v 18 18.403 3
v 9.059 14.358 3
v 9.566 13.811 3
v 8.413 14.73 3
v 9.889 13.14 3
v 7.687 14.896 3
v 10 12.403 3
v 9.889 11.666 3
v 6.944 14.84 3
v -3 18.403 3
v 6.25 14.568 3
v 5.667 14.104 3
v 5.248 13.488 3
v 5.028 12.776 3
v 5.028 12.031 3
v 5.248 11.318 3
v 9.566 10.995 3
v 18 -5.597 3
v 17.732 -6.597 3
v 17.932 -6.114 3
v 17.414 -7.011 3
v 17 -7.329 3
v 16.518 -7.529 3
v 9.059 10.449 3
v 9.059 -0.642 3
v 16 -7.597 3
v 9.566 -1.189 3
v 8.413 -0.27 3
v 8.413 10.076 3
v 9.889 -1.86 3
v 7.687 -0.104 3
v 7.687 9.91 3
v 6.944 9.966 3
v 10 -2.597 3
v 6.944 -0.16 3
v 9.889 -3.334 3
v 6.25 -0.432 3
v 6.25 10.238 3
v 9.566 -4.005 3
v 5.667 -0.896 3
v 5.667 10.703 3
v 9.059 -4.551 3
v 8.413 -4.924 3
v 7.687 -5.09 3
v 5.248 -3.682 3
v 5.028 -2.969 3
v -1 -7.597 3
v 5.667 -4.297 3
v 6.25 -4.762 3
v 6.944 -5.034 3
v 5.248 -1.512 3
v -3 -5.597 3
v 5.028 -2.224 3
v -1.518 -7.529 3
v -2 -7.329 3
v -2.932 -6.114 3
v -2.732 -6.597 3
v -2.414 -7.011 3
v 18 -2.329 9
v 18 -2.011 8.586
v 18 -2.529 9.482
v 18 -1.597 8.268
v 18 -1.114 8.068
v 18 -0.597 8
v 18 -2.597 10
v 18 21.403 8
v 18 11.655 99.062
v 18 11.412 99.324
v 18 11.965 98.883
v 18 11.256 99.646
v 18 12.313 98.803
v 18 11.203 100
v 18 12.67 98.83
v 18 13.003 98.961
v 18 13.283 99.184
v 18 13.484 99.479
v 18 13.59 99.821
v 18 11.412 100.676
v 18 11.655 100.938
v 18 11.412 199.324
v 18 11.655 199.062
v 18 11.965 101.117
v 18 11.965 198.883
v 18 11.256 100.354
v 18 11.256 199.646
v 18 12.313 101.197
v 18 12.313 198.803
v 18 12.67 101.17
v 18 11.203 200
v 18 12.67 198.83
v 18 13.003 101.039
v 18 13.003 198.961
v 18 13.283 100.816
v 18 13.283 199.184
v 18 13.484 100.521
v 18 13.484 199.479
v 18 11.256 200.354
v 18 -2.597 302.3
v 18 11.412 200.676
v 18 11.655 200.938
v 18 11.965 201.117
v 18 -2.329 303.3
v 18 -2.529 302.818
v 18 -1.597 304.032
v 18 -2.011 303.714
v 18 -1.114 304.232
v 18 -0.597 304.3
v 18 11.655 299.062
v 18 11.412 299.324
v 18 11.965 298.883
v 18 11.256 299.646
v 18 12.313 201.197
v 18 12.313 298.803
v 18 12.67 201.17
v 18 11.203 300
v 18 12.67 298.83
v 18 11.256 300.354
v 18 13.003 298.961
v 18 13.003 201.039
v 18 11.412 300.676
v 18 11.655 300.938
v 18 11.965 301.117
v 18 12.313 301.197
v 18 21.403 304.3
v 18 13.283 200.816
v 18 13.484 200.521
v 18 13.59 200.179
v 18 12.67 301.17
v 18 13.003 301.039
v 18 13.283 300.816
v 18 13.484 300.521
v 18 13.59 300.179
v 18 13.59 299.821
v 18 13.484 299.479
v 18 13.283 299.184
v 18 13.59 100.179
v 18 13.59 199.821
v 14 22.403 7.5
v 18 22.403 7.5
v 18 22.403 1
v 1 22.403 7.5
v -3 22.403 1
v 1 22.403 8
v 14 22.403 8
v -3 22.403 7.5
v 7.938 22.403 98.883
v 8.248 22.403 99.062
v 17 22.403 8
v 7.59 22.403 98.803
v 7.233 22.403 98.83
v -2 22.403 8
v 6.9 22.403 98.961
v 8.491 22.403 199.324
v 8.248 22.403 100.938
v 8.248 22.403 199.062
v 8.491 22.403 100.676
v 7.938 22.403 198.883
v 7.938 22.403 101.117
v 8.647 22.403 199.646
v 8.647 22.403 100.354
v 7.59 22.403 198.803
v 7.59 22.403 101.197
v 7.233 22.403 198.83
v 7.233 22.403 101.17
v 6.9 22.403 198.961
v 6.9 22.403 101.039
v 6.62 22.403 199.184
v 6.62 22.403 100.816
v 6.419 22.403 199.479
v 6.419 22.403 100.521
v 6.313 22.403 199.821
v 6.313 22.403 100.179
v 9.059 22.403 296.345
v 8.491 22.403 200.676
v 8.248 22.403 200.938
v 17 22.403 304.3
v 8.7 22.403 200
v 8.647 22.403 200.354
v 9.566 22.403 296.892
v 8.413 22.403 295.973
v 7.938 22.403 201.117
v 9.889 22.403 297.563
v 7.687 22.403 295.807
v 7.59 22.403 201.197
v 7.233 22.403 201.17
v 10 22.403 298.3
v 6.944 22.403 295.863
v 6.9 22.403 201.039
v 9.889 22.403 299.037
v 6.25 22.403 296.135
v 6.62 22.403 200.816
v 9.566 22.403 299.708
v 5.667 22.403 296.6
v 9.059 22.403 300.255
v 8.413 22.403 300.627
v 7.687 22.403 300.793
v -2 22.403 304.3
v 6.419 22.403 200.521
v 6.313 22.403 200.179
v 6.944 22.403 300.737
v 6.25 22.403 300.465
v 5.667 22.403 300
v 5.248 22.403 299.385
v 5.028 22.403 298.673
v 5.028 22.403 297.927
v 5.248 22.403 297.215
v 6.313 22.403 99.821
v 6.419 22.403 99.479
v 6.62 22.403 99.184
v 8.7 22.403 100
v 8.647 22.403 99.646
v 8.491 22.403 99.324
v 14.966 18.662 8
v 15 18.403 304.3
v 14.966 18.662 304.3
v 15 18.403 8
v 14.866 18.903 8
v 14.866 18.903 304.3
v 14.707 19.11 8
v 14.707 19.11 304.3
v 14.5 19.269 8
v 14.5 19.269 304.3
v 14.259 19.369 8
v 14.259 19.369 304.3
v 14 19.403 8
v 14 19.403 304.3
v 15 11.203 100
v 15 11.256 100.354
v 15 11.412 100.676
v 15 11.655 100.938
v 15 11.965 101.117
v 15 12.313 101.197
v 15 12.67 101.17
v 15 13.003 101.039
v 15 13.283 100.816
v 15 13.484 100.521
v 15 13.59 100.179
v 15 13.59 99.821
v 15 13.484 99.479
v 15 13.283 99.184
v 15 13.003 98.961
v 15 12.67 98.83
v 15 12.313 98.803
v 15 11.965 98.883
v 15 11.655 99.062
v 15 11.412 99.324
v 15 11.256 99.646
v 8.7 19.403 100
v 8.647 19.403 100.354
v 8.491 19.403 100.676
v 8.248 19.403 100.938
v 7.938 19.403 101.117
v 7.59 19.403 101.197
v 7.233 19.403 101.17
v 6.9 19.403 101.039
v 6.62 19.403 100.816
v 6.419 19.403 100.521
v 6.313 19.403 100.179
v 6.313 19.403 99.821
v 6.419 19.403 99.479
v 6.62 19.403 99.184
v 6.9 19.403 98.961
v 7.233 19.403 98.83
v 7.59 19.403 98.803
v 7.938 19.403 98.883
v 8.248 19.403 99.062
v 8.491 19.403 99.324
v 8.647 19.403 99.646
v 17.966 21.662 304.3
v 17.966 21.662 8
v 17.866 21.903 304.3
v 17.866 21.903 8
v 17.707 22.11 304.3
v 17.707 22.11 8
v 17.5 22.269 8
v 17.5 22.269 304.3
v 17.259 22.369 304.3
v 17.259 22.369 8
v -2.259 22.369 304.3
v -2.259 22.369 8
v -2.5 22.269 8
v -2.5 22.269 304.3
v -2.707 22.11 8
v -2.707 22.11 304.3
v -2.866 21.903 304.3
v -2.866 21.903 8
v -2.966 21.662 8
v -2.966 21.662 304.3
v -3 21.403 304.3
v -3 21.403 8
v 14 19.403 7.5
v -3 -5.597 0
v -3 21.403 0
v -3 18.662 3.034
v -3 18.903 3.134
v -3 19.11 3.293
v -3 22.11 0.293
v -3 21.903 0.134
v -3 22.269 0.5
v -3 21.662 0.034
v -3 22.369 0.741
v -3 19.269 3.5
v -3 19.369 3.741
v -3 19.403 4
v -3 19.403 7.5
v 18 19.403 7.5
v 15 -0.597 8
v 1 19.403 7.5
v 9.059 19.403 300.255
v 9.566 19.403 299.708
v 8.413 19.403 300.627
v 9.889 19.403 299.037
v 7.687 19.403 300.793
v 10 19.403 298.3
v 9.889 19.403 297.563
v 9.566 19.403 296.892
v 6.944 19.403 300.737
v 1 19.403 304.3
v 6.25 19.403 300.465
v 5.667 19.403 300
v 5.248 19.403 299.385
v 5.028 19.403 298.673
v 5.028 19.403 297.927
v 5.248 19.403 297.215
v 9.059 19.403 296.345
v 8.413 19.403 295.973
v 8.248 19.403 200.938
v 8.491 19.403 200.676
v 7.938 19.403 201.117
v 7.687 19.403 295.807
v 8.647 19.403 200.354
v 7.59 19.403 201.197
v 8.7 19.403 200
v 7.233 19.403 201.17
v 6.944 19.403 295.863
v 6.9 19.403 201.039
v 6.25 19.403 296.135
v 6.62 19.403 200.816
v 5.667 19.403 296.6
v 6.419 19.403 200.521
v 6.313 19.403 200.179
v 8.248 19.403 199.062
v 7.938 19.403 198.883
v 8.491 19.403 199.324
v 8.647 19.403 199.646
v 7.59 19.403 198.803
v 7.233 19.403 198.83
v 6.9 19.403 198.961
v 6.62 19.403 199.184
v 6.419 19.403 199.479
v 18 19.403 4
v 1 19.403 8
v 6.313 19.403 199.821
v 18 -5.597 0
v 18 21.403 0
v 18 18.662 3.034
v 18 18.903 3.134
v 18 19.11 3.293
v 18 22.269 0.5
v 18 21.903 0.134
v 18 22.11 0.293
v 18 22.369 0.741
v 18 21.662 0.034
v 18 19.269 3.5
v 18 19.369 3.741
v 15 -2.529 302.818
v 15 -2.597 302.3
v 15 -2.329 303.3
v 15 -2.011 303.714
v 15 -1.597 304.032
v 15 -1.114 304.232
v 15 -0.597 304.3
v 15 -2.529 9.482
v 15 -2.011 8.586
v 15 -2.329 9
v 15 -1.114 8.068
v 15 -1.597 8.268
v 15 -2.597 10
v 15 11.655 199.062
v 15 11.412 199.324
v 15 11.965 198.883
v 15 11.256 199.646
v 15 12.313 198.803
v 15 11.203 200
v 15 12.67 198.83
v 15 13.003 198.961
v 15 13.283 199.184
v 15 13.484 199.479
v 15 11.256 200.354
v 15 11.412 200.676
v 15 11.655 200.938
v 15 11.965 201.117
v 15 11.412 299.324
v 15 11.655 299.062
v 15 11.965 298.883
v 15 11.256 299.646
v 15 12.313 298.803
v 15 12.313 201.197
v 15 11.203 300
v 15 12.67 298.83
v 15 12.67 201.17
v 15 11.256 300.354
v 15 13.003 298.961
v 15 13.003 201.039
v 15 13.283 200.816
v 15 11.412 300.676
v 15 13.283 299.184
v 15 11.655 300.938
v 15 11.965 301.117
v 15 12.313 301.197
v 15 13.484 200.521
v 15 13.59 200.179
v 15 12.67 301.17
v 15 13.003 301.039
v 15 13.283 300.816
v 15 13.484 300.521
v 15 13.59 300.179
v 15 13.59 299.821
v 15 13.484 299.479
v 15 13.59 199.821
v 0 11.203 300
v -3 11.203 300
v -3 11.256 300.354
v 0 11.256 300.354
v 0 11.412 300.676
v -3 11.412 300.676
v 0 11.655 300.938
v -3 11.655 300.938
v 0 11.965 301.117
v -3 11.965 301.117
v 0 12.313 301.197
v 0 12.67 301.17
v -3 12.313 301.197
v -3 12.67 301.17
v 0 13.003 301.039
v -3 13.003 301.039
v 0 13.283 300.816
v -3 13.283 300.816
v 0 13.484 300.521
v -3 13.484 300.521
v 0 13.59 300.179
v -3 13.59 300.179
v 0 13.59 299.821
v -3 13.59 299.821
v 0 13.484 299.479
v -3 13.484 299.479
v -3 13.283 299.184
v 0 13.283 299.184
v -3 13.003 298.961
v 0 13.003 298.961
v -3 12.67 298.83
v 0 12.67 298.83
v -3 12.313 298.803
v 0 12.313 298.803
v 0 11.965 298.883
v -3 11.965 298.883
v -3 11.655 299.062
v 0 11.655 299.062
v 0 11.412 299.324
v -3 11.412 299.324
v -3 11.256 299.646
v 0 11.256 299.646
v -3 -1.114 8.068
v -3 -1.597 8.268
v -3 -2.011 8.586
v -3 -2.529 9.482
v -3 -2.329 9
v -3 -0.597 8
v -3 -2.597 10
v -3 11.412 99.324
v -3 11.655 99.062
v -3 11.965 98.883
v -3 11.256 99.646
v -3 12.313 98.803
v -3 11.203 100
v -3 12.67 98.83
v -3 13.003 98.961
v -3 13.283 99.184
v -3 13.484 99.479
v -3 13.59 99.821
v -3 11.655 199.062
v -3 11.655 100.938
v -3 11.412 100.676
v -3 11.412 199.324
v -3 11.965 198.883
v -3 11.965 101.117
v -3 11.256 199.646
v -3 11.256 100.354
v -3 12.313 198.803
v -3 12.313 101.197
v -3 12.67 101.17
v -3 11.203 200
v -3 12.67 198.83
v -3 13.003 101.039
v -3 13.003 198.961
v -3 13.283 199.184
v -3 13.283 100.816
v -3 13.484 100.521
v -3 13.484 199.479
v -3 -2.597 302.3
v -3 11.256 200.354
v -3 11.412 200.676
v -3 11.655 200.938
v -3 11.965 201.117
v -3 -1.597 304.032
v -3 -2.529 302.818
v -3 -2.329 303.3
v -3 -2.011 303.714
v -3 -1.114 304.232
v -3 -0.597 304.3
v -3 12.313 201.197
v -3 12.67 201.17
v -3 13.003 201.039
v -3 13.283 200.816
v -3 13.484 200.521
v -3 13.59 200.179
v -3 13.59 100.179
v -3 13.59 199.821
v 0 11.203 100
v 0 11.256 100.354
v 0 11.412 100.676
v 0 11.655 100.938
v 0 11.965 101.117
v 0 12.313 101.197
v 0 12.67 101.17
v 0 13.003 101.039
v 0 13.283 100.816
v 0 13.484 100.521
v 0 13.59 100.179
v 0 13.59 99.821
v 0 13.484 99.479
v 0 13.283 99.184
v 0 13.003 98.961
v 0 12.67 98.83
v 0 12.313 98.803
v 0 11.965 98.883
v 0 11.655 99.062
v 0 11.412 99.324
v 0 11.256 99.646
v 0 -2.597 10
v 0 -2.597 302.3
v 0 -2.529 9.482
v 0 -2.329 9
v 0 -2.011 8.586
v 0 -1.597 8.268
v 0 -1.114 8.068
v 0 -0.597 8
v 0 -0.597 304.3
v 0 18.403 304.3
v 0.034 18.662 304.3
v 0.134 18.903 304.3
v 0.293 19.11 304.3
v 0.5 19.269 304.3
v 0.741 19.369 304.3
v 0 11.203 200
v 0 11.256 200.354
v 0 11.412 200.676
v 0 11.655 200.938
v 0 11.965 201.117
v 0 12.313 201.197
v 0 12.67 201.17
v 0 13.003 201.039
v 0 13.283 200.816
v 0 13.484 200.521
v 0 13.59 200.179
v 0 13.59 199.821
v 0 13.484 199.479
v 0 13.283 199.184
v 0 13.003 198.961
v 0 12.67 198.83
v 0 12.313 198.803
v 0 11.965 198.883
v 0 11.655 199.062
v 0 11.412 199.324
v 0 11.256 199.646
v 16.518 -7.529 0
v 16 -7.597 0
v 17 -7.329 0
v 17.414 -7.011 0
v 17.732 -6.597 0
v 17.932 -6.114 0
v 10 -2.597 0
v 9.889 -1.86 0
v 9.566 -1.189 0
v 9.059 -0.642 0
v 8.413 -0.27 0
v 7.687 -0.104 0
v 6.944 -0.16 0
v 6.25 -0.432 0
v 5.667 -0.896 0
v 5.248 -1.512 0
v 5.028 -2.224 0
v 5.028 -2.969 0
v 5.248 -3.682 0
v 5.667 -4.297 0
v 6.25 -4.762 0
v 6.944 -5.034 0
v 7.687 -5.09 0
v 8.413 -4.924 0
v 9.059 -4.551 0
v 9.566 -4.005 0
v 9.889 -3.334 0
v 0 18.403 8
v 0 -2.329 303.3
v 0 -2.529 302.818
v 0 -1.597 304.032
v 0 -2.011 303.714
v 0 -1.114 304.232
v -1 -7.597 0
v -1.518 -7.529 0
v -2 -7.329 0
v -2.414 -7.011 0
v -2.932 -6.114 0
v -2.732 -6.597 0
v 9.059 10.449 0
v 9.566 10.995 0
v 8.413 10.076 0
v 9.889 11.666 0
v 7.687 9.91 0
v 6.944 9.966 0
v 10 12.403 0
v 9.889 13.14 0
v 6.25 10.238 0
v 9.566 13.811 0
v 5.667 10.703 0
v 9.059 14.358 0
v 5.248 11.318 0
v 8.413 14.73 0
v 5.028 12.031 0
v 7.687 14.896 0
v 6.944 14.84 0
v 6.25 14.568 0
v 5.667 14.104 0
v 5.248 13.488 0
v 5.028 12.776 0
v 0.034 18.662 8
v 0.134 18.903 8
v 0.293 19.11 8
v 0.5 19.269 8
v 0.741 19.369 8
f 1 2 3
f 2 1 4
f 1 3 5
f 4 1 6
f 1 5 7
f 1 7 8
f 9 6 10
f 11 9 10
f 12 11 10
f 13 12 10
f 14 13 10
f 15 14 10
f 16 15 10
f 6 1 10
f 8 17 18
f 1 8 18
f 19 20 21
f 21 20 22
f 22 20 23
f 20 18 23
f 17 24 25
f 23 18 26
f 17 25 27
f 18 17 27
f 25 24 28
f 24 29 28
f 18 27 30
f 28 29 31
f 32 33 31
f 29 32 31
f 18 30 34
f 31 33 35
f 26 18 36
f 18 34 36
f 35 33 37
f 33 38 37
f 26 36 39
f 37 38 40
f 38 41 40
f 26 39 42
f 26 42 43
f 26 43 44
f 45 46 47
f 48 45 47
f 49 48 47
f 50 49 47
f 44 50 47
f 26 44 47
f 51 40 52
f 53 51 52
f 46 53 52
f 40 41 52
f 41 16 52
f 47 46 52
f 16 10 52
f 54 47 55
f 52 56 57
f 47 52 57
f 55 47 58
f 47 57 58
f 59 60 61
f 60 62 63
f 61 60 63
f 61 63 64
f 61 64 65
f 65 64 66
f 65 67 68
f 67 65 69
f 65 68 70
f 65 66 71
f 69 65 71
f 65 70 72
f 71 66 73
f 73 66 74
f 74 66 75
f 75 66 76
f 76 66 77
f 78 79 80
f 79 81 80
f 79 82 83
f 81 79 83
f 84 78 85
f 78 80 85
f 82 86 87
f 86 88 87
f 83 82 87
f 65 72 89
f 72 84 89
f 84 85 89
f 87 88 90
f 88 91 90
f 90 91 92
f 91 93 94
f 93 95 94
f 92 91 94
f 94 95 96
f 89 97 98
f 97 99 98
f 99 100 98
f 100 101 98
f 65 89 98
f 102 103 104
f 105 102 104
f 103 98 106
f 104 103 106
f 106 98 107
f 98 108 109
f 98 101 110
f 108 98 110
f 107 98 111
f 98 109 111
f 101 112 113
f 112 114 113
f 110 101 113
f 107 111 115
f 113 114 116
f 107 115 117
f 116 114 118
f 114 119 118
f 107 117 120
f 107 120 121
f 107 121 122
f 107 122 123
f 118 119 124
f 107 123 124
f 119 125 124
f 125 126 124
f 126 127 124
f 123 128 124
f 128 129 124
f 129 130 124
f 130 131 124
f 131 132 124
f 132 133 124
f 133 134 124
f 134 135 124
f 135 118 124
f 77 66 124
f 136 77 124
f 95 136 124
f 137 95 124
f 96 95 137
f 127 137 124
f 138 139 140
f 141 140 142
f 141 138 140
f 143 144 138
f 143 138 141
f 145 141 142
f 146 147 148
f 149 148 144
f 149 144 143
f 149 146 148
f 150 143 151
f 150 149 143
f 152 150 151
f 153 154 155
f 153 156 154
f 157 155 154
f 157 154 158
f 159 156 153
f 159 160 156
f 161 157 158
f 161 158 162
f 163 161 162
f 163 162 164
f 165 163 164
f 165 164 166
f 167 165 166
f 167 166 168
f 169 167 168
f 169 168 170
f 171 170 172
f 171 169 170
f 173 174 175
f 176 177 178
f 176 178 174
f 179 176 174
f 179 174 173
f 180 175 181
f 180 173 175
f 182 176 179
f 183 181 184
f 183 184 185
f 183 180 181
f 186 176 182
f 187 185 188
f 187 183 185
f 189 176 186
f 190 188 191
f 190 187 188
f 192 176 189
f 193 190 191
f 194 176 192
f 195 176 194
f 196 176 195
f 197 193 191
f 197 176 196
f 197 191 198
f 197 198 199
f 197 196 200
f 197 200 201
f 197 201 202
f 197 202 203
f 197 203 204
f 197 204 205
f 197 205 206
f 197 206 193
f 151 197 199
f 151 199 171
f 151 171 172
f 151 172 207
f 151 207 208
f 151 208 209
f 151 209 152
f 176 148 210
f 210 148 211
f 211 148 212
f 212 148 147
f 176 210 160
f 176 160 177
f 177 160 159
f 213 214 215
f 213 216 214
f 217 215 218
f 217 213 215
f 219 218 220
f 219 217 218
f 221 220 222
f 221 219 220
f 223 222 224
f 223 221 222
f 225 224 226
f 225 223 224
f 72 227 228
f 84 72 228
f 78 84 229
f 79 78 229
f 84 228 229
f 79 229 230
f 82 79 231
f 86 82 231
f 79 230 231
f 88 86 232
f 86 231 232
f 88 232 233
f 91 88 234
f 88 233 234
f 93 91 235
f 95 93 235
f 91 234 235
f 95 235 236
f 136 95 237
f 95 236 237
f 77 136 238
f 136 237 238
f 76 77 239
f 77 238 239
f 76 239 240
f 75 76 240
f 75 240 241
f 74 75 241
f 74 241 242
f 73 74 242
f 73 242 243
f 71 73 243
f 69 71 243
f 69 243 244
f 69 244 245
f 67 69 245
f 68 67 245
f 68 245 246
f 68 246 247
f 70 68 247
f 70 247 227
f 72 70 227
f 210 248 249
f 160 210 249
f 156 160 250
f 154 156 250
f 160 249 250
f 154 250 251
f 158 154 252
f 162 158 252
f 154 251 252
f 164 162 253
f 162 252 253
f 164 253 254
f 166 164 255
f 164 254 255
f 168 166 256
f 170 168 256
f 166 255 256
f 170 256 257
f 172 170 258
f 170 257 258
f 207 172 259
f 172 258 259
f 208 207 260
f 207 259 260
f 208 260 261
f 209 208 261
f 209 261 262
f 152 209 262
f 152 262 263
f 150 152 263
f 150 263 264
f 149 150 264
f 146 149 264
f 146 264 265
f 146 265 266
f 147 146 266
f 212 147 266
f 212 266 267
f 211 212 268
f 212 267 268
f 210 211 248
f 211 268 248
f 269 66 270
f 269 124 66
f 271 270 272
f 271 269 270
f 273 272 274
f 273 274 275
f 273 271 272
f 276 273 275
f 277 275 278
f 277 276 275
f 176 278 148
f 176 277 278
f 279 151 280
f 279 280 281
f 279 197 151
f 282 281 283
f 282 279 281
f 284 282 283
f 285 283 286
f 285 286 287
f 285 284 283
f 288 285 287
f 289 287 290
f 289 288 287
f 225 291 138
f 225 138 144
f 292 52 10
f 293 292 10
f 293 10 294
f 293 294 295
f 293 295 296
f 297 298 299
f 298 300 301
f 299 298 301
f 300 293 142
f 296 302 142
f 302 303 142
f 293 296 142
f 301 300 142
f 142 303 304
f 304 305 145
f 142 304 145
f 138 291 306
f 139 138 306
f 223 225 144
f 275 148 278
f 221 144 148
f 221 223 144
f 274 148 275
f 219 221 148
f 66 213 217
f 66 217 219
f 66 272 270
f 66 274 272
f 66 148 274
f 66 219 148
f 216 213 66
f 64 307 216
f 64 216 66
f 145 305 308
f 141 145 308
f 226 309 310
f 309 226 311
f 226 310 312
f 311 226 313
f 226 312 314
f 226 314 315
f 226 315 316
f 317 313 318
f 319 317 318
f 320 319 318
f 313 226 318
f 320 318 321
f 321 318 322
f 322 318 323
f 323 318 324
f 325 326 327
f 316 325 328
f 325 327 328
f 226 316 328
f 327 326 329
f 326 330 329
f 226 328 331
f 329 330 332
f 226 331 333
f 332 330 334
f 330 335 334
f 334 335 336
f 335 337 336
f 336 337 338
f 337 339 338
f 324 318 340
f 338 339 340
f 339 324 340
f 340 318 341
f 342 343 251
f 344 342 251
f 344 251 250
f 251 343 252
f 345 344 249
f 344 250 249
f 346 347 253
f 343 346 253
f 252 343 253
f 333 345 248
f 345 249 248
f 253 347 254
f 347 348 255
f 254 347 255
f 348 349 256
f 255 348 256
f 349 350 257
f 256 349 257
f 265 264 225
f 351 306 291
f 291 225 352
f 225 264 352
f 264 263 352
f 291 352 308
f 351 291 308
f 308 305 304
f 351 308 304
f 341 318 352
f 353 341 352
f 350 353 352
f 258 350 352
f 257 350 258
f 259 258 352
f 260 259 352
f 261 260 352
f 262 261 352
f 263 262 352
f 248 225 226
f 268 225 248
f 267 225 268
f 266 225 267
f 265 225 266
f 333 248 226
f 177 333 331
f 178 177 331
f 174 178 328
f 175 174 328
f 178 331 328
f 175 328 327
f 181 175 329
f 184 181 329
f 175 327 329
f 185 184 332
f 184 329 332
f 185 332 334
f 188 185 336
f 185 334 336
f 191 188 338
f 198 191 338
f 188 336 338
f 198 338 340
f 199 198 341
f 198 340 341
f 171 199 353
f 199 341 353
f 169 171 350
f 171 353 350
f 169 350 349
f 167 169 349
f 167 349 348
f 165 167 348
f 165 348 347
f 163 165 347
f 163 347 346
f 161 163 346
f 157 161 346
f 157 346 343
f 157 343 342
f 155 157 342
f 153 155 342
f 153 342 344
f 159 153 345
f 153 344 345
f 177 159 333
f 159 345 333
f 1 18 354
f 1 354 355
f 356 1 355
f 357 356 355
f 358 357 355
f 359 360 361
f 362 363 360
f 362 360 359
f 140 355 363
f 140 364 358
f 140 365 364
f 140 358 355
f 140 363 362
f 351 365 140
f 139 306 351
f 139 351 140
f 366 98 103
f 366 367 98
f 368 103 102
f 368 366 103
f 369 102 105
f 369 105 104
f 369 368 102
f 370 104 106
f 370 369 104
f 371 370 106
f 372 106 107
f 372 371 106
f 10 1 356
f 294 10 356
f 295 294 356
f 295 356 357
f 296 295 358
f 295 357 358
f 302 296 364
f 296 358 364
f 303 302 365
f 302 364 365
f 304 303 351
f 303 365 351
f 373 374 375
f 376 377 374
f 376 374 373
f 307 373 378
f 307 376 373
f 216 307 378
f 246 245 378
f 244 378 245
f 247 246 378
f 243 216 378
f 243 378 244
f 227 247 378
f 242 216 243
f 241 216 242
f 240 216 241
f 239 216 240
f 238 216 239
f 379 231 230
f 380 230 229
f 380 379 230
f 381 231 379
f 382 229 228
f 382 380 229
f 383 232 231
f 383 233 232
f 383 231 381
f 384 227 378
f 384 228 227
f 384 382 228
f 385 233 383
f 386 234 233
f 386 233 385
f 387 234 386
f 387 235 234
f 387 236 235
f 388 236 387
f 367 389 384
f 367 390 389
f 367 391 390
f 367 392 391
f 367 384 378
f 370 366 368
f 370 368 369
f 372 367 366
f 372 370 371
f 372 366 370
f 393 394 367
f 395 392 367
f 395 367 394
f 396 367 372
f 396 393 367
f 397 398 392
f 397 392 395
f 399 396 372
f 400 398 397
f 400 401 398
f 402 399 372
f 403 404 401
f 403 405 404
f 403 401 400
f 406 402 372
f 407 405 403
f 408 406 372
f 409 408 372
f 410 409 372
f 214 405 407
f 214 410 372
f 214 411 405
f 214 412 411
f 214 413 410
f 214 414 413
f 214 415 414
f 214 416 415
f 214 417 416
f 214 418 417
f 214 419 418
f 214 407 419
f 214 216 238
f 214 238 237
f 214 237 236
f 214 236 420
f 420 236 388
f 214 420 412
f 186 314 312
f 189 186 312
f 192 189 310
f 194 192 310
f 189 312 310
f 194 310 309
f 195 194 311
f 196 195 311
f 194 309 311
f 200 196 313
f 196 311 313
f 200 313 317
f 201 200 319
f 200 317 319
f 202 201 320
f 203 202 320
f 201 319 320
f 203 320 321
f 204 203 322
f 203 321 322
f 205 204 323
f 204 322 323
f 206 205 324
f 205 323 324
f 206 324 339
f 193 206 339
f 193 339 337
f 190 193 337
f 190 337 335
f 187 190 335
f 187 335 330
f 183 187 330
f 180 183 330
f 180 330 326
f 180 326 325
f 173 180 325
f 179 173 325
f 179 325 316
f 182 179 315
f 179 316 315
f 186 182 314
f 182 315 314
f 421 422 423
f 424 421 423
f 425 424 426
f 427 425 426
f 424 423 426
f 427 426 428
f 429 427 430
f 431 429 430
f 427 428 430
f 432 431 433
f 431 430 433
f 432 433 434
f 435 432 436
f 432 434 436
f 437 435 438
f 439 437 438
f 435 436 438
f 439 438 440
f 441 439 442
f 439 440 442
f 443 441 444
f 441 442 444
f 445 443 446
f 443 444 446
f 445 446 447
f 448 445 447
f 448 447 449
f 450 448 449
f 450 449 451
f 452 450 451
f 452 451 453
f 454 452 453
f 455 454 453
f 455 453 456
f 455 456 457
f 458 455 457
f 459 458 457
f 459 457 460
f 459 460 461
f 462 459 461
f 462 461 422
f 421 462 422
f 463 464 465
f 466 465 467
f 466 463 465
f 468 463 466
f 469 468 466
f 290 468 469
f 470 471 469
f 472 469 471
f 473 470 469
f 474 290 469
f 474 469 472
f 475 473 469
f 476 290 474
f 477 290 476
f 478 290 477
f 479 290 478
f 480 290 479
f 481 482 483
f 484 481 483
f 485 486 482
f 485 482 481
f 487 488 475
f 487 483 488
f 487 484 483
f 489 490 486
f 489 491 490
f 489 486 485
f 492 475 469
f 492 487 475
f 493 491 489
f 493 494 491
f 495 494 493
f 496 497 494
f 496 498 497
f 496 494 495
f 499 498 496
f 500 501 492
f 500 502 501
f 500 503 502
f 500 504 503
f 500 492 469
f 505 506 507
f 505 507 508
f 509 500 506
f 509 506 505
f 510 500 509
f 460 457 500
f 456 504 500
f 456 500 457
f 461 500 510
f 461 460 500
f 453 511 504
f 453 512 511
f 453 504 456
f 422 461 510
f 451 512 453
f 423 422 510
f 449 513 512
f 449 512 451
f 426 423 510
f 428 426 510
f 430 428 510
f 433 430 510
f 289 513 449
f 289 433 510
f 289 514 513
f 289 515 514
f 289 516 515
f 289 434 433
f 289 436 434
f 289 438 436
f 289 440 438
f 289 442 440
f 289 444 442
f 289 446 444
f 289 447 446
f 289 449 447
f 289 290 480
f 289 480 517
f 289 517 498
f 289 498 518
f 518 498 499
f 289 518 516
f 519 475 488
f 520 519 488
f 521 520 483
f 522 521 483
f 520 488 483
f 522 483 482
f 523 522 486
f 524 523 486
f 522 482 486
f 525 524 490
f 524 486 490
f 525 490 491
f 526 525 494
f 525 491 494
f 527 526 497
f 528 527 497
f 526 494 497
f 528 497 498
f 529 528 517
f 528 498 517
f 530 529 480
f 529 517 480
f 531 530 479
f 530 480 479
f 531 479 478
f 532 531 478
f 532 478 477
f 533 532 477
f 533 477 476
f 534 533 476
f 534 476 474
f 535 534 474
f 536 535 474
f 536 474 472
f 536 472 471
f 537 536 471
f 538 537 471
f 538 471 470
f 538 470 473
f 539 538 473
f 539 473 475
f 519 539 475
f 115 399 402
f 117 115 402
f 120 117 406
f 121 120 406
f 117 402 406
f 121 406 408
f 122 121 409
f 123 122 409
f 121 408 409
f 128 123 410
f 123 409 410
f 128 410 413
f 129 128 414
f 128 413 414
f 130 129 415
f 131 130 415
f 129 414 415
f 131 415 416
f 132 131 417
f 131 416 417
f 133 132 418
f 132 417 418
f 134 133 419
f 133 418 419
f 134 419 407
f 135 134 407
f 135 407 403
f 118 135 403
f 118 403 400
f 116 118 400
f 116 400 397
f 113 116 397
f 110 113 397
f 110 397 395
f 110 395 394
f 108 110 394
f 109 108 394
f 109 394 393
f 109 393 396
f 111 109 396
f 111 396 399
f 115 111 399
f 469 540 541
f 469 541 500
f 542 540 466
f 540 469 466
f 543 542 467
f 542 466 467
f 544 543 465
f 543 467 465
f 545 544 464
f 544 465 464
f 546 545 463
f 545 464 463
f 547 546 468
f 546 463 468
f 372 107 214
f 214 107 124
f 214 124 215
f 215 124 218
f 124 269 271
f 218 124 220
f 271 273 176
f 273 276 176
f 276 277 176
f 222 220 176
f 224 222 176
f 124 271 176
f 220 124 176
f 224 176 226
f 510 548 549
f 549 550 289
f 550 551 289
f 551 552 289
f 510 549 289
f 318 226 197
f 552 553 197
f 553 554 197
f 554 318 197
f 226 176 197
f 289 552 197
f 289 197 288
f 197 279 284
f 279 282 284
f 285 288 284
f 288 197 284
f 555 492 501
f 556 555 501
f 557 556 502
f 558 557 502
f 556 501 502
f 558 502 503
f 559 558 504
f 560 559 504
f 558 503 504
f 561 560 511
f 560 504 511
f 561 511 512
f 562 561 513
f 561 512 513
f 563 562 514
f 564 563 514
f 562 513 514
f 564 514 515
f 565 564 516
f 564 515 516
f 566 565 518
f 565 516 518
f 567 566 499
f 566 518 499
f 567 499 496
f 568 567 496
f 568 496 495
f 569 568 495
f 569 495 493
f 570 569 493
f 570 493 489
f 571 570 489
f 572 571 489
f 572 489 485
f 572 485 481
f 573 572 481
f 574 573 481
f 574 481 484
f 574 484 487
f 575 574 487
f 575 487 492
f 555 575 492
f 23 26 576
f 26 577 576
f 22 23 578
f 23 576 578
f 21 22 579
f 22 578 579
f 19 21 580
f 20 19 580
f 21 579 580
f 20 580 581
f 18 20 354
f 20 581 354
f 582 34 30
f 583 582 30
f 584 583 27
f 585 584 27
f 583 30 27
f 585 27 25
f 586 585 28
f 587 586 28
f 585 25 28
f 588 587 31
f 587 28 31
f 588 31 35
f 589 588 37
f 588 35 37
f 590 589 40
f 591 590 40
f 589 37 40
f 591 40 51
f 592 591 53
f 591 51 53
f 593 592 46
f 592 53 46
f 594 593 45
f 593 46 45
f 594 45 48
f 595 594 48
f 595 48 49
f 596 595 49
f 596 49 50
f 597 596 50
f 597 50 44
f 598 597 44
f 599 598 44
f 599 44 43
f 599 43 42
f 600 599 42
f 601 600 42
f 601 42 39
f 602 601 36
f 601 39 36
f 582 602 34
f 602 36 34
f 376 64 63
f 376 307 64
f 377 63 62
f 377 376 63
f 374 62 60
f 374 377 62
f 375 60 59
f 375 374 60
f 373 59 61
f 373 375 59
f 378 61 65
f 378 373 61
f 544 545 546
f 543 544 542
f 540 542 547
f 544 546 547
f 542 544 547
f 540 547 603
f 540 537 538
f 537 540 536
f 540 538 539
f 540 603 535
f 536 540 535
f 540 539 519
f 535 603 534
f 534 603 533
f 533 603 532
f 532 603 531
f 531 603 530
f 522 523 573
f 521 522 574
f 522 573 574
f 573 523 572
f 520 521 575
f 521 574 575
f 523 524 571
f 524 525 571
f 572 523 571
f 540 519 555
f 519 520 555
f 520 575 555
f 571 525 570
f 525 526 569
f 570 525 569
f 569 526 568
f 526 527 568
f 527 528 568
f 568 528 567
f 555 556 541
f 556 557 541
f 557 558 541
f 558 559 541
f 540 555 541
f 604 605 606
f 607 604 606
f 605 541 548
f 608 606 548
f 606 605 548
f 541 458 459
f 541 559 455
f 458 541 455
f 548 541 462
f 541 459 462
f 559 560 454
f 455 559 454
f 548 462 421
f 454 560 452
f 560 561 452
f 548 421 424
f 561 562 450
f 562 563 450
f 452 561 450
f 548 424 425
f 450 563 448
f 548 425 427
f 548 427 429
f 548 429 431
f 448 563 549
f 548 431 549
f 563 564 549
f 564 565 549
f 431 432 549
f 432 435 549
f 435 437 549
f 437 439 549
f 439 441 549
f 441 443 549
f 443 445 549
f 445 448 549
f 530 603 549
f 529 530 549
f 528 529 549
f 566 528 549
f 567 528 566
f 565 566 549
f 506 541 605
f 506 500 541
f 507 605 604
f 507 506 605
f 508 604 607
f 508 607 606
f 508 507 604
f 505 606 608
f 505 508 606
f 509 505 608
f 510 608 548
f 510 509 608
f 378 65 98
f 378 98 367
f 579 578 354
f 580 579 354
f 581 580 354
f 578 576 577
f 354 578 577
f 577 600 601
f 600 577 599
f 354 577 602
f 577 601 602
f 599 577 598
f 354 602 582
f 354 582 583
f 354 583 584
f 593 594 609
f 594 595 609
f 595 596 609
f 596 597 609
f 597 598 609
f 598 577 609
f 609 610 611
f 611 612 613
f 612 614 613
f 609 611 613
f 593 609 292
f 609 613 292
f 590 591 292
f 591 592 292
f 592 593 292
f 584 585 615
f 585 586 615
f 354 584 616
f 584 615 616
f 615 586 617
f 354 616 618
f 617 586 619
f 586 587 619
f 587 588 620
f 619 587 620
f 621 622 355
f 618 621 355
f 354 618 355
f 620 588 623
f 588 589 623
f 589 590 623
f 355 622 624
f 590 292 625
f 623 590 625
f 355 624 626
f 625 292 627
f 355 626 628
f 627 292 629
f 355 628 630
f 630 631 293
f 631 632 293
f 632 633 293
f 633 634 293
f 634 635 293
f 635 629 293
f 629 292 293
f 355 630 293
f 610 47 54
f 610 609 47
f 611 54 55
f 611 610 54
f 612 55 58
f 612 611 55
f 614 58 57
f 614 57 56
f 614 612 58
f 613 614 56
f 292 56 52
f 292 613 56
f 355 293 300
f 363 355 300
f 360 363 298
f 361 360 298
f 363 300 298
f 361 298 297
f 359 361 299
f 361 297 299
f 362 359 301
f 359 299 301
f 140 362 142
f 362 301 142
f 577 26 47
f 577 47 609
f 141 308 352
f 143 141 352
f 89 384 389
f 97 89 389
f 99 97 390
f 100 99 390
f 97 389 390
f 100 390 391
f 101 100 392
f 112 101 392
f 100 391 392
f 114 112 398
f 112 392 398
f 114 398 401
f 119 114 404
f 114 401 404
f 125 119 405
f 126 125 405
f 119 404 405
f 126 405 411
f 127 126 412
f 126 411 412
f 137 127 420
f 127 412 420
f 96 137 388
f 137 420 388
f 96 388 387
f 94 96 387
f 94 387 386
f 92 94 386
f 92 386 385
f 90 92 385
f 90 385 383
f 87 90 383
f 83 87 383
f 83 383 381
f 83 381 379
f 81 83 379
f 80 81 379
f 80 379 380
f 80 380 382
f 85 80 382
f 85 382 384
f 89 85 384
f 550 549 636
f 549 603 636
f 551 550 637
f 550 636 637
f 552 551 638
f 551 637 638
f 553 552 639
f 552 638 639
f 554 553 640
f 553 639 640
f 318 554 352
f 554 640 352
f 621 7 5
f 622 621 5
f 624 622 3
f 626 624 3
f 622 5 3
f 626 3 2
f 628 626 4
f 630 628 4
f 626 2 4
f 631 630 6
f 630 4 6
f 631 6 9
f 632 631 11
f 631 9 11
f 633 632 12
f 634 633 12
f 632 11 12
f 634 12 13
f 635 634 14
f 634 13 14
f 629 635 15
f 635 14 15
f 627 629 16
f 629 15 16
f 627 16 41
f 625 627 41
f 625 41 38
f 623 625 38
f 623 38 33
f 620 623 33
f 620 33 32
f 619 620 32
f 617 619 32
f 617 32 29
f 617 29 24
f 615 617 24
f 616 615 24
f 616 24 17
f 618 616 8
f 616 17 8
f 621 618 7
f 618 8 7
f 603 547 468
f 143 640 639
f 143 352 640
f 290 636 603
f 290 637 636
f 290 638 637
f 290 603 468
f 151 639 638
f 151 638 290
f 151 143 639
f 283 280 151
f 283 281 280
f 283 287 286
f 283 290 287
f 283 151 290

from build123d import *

# Parameters (mm, degrees)
F1_DEPTH  = 15
F2_W      = 3
F2_H      = 296.3
F3_DEPTH  = 25
F4_R      = 2.5
F5_DEPTH  = 3
F6_W      = 1
F6_H      = 0.5
F7_DEPTH  = 3
F8_R      = 1
F9_R      = 2.5
F9_R_2    = 1.2
F10_DEPTH = 3
F11_R     = 1.2
F12_DEPTH = 34.2
F13_DEPTH = 3
F14_R     = 2


with BuildPart() as f1:
    # F0 (on Right) → F1 (new body)
    with BuildSketch(Plane.YZ):
        Polygon((-7.5968508422, 3), (-7.5968508422, 0), (22.4031491578, 0), (22.4031491578, 304.3), (19.4031491578, 304.3), (19.4031491578, 3), align=None)
    extrude(amount=F1_DEPTH)

    # F2 (on face) → F3 (join)
    with BuildSketch(Plane(origin=(0, 22.4031491578, 0), x_dir=(-1, 0, 0), z_dir=(0, 1, 0))):
        with Locations((1.5, 156.15)):
            Rectangle(F2_W, F2_H)
        with Locations((-16.5, 156.15)):
            Rectangle(F2_W, F2_H)
    extrude(amount=-F3_DEPTH)

    # F4 (on face) → F5 (cut)
    with BuildSketch(Plane.XY.offset(3)):
        with Locations((7.5, -2.5968508422)):
            Circle(F4_R)
        with Locations((7.5, 12.4031491578)):
            Circle(F4_R)
    extrude(amount=-F5_DEPTH, mode=Mode.SUBTRACT)

    # F6 (on face) → F7 (cut)
    with BuildSketch(Plane.XZ.offset(-19.4031491578)):
        with Locations((0.5, 7.75)):
            Rectangle(F6_W, F6_H)
        with Locations((14.5, 7.75)):
            Rectangle(F6_W, F6_H)
    extrude(amount=-F7_DEPTH, mode=Mode.SUBTRACT)

    # F8
    f8_edges = [f1.edges().sort_by_distance(p)[0] for p in [
        (7.5, 19.403149, 3),
        (7.5, 22.403149, 0),
        (0, 19.403149, 156.15),
        (-3, 22.403149, 156.15),
        (18, 22.403149, 156.15),
        (15, 19.403149, 156.15),
    ]]
    fillet(f8_edges, radius=F8_R)

    # F9 (on face) → F10 (cut)
    with BuildSketch(Plane.XZ.offset(-19.4031491578)):
        with Locations((7.5, 298.3)):
            Circle(F9_R)
        with Locations((7.5, 100)):
            Circle(F9_R_2)
        with Locations((7.5, 200)):
            Circle(F9_R_2)
    extrude(amount=-F10_DEPTH, mode=Mode.SUBTRACT)

    # F11 (on face) → F12 (cut)
    with BuildSketch(Plane(origin=(-3, 0, 0), x_dir=(0, -1, 0), z_dir=(-1, 0, 0))):
        with Locations((-12.4031491578, 200)):
            Circle(F11_R)
        with Locations((-12.4031491578, 100)):
            Circle(F11_R)
        with Locations((-12.4031491578, 300)):
            Circle(F11_R)
    extrude(amount=-F12_DEPTH, mode=Mode.SUBTRACT)

    # F13 (add, symmetric): faces of the model
    f13_faces = [f1.faces().sort_by_distance(p)[0] for p in [
        (0, 9.1577983799, 1.9953507779),
        (15, 9.1577983799, 1.9953507779),
    ]]
    extrude(f13_faces, amount=F13_DEPTH, both=True, dir=(-1, 0, 0))

    # F14
    f14_edges = [f1.edges().sort_by_distance(p)[0] for p in [
        (-3, -7.596851, 1.5),
        (18, -7.596851, 1.5),
        (16.5, -2.596851, 8),
        (-1.5, -2.596851, 8),
        (-1.5, -2.596851, 304.3),
        (16.5, -2.596851, 304.3),
    ]]
    fillet(f14_edges, radius=F14_R)


solid = f1.part
